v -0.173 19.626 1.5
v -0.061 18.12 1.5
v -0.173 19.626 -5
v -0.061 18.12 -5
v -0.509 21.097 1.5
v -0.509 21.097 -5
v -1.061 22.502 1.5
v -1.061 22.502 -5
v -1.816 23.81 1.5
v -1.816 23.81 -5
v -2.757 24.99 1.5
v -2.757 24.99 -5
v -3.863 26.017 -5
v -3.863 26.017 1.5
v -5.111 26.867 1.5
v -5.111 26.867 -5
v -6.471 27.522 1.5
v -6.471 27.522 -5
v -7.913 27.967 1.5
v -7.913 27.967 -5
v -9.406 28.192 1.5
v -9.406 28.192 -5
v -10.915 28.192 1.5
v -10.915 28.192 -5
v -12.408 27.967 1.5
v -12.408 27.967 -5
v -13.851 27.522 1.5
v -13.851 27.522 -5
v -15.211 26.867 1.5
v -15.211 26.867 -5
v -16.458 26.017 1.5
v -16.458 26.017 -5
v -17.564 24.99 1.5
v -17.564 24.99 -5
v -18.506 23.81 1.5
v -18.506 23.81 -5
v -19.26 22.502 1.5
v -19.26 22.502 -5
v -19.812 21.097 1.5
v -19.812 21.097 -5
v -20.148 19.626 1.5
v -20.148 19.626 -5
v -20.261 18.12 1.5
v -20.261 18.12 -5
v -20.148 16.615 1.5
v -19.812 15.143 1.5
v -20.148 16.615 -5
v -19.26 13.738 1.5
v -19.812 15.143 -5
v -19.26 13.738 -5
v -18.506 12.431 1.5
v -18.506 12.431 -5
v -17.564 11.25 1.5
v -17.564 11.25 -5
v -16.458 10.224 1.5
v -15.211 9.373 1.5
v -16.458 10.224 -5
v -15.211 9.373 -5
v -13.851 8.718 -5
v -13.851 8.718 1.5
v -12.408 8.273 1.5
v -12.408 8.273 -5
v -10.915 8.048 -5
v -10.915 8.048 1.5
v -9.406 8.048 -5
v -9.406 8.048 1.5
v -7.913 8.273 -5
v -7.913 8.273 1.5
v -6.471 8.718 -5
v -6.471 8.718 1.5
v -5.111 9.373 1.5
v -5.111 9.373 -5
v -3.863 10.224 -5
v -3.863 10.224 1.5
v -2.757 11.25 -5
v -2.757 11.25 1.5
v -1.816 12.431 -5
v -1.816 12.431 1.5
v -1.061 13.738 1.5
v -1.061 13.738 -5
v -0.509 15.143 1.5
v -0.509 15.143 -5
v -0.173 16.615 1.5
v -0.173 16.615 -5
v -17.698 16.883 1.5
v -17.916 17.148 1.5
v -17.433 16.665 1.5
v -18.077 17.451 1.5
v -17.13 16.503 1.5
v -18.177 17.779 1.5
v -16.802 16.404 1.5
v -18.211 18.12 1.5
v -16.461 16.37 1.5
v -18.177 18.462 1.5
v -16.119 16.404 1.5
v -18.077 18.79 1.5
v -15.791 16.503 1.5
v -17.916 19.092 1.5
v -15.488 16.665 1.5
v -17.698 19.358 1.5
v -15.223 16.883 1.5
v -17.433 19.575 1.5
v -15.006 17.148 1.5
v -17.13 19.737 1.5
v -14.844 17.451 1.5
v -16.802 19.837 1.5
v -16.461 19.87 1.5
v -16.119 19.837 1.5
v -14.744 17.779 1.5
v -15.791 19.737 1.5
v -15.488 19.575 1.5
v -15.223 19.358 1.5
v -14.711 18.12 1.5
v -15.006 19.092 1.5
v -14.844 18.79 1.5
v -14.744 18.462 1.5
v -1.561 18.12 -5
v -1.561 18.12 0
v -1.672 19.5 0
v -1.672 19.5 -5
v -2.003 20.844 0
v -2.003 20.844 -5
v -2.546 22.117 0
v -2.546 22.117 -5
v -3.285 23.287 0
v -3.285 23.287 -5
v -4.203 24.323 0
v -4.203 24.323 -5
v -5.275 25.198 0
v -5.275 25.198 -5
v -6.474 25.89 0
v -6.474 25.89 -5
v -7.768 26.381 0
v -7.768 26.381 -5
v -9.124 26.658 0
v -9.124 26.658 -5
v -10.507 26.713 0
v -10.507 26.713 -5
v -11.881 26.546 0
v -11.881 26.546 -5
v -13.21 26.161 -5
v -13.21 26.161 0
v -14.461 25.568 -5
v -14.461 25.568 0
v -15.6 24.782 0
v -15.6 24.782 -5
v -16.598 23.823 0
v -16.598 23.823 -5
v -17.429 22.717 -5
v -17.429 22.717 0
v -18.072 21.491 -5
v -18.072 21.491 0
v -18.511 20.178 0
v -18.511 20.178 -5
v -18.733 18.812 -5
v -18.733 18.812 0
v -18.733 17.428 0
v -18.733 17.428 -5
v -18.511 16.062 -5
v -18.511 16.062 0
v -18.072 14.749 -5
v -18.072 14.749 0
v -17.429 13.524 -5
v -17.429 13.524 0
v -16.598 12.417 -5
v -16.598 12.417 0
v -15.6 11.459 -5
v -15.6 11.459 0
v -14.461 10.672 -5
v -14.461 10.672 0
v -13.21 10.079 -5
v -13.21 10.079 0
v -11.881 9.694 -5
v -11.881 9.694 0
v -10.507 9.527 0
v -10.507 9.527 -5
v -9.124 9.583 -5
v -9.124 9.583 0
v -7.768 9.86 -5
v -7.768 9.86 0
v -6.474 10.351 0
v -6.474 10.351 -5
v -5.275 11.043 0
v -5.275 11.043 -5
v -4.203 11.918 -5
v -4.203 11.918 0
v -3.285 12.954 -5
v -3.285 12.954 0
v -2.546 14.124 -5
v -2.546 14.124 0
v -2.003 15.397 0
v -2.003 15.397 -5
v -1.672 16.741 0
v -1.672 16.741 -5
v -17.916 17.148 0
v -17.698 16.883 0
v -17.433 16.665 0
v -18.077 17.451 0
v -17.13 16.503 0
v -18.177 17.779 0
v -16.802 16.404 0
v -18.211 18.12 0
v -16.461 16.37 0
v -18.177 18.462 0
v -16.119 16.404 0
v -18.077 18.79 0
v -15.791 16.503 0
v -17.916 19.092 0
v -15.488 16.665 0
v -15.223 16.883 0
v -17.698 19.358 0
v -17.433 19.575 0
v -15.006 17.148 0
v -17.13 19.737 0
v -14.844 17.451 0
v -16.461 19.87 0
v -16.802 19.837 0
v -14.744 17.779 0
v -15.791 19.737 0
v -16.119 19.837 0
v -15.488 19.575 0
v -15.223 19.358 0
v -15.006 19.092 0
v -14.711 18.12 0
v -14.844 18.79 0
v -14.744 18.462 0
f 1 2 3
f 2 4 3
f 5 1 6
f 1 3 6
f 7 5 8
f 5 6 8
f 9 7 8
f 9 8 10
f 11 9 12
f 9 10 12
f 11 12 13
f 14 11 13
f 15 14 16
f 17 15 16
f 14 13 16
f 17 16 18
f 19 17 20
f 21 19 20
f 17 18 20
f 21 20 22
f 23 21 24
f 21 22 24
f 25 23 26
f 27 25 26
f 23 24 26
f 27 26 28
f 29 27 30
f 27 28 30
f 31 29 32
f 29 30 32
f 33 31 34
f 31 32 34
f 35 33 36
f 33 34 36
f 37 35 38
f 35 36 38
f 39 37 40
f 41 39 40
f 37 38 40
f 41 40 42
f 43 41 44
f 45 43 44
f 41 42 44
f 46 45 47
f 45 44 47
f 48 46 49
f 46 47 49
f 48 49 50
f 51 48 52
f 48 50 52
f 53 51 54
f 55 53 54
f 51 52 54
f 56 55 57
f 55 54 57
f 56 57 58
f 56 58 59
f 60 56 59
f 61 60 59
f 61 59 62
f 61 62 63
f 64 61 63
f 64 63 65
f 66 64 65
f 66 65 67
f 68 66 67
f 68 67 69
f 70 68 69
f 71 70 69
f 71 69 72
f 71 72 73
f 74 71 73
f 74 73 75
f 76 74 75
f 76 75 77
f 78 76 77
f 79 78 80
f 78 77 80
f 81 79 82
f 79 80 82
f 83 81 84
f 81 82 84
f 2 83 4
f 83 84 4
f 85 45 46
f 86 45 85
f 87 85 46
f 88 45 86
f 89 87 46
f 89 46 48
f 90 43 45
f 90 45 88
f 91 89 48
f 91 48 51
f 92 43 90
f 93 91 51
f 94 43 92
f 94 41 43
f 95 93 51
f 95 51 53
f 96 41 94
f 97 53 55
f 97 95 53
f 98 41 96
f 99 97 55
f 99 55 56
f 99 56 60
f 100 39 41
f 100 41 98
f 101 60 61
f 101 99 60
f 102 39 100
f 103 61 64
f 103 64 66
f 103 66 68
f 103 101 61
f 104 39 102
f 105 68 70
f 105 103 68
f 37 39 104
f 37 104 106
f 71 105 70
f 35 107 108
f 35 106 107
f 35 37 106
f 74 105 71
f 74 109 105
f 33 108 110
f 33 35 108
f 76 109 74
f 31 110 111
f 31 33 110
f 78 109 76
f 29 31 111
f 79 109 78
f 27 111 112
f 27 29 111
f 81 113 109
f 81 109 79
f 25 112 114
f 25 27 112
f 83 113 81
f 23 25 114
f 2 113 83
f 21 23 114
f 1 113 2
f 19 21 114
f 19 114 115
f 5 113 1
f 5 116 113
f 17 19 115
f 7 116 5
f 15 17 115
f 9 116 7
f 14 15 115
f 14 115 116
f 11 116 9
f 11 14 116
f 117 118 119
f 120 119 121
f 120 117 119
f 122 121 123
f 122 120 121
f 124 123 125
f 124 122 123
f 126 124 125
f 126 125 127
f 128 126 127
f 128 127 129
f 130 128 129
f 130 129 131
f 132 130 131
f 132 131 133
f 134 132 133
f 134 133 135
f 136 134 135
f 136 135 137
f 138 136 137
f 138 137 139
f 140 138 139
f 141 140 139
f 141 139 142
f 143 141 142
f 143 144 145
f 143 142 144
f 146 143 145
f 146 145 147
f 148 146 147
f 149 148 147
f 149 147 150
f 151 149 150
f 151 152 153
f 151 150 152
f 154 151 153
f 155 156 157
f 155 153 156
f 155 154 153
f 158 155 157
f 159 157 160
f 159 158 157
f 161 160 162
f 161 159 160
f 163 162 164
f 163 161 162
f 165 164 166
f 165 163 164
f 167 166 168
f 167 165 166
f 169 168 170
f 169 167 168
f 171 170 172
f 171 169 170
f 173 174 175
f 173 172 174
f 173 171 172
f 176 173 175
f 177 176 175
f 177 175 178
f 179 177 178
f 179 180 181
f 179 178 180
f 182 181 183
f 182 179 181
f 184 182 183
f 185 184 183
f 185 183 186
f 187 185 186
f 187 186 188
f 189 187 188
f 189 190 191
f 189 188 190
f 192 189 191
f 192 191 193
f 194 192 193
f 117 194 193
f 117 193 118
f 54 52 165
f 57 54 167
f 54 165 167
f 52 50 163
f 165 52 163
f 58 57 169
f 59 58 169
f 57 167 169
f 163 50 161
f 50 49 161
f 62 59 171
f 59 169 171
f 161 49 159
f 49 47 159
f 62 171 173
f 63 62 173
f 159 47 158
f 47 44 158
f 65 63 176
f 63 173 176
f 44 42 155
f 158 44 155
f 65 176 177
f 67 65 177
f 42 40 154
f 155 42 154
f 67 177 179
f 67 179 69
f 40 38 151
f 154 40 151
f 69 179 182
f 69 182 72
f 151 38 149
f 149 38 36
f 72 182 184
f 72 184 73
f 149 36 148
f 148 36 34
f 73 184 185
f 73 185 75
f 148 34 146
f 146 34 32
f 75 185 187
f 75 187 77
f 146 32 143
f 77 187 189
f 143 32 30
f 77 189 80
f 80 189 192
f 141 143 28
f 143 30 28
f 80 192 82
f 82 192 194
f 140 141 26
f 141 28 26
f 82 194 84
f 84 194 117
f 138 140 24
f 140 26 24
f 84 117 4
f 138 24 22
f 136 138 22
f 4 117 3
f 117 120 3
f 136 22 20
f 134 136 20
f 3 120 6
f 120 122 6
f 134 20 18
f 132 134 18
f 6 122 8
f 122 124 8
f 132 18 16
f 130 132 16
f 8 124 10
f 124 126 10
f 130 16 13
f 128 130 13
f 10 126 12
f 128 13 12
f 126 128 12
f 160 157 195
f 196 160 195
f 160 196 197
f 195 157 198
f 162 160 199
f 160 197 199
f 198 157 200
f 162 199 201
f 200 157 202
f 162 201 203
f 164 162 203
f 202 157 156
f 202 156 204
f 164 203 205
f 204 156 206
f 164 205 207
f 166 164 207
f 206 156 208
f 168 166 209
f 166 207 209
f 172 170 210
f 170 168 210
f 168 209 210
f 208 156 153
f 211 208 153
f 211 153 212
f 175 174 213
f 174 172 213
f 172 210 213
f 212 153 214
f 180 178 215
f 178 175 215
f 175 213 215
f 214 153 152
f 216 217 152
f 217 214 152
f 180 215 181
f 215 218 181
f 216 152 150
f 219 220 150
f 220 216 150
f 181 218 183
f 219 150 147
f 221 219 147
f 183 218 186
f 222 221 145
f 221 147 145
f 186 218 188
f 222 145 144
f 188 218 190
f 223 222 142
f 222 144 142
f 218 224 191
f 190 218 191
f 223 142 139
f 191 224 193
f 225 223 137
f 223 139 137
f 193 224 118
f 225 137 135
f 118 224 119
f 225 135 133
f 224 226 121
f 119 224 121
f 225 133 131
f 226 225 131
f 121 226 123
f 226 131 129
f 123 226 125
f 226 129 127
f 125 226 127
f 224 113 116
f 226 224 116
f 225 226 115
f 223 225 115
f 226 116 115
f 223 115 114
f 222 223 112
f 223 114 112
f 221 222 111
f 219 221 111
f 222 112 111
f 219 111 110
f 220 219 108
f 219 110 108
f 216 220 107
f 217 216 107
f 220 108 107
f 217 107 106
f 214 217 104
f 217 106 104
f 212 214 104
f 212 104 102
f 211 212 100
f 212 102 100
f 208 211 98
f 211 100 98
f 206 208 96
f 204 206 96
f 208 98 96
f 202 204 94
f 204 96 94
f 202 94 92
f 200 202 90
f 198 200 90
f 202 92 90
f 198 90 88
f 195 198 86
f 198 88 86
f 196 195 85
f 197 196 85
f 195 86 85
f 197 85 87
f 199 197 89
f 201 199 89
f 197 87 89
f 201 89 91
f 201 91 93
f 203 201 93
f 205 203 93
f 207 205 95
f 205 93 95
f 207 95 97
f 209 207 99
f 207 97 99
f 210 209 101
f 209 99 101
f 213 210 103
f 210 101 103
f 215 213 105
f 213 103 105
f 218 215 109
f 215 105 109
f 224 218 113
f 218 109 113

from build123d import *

# Parameters (mm, degrees)
BOSS_EXTRUDE1_DEPTH      = 1.5
BOSS_EXTRUDE1_DEPTH_BACK = 5
SKETCH1_R                = 10.1
SKETCH1_R_2              = 8.6
SKETCH2_R                = 10.1
BOSS_EXTRUDE2_DEPTH      = 1.5
SKETCH3_R                = 1.75
CUT_EXTRUDE1_DEPTH       = 1.5


with BuildPart() as part:
    # Sketch1 → Boss-Extrude1 (new, two sides: drawn at the far end of the back side and taken through both)
    with BuildSketch(Plane.XY.offset(-BOSS_EXTRUDE1_DEPTH_BACK)):
        with Locations((-10.160617153, 18.12022925)):
            Circle(SKETCH1_R)
        with Locations((-10.160617153, 18.12022925)):
            Circle(SKETCH1_R_2, mode=Mode.SUBTRACT)
    extrude(amount=BOSS_EXTRUDE1_DEPTH + BOSS_EXTRUDE1_DEPTH_BACK)

    # Sketch2 → Boss-Extrude2 (add)
    with BuildSketch(Plane.XY.offset(1.5)):
        with Locations((-10.160617153, 18.12022925)):
            Circle(SKETCH2_R)
    extrude(amount=-BOSS_EXTRUDE2_DEPTH)

    # Sketch3 → Cut-Extrude1 (cut)
    with BuildSketch(Plane.XY.offset(1.5)):
        with Locations((-16.460617153, 18.12022925)):
            Circle(SKETCH3_R)
    extrude(amount=-CUT_EXTRUDE1_DEPTH, mode=Mode.SUBTRACT)


solid = part.part
